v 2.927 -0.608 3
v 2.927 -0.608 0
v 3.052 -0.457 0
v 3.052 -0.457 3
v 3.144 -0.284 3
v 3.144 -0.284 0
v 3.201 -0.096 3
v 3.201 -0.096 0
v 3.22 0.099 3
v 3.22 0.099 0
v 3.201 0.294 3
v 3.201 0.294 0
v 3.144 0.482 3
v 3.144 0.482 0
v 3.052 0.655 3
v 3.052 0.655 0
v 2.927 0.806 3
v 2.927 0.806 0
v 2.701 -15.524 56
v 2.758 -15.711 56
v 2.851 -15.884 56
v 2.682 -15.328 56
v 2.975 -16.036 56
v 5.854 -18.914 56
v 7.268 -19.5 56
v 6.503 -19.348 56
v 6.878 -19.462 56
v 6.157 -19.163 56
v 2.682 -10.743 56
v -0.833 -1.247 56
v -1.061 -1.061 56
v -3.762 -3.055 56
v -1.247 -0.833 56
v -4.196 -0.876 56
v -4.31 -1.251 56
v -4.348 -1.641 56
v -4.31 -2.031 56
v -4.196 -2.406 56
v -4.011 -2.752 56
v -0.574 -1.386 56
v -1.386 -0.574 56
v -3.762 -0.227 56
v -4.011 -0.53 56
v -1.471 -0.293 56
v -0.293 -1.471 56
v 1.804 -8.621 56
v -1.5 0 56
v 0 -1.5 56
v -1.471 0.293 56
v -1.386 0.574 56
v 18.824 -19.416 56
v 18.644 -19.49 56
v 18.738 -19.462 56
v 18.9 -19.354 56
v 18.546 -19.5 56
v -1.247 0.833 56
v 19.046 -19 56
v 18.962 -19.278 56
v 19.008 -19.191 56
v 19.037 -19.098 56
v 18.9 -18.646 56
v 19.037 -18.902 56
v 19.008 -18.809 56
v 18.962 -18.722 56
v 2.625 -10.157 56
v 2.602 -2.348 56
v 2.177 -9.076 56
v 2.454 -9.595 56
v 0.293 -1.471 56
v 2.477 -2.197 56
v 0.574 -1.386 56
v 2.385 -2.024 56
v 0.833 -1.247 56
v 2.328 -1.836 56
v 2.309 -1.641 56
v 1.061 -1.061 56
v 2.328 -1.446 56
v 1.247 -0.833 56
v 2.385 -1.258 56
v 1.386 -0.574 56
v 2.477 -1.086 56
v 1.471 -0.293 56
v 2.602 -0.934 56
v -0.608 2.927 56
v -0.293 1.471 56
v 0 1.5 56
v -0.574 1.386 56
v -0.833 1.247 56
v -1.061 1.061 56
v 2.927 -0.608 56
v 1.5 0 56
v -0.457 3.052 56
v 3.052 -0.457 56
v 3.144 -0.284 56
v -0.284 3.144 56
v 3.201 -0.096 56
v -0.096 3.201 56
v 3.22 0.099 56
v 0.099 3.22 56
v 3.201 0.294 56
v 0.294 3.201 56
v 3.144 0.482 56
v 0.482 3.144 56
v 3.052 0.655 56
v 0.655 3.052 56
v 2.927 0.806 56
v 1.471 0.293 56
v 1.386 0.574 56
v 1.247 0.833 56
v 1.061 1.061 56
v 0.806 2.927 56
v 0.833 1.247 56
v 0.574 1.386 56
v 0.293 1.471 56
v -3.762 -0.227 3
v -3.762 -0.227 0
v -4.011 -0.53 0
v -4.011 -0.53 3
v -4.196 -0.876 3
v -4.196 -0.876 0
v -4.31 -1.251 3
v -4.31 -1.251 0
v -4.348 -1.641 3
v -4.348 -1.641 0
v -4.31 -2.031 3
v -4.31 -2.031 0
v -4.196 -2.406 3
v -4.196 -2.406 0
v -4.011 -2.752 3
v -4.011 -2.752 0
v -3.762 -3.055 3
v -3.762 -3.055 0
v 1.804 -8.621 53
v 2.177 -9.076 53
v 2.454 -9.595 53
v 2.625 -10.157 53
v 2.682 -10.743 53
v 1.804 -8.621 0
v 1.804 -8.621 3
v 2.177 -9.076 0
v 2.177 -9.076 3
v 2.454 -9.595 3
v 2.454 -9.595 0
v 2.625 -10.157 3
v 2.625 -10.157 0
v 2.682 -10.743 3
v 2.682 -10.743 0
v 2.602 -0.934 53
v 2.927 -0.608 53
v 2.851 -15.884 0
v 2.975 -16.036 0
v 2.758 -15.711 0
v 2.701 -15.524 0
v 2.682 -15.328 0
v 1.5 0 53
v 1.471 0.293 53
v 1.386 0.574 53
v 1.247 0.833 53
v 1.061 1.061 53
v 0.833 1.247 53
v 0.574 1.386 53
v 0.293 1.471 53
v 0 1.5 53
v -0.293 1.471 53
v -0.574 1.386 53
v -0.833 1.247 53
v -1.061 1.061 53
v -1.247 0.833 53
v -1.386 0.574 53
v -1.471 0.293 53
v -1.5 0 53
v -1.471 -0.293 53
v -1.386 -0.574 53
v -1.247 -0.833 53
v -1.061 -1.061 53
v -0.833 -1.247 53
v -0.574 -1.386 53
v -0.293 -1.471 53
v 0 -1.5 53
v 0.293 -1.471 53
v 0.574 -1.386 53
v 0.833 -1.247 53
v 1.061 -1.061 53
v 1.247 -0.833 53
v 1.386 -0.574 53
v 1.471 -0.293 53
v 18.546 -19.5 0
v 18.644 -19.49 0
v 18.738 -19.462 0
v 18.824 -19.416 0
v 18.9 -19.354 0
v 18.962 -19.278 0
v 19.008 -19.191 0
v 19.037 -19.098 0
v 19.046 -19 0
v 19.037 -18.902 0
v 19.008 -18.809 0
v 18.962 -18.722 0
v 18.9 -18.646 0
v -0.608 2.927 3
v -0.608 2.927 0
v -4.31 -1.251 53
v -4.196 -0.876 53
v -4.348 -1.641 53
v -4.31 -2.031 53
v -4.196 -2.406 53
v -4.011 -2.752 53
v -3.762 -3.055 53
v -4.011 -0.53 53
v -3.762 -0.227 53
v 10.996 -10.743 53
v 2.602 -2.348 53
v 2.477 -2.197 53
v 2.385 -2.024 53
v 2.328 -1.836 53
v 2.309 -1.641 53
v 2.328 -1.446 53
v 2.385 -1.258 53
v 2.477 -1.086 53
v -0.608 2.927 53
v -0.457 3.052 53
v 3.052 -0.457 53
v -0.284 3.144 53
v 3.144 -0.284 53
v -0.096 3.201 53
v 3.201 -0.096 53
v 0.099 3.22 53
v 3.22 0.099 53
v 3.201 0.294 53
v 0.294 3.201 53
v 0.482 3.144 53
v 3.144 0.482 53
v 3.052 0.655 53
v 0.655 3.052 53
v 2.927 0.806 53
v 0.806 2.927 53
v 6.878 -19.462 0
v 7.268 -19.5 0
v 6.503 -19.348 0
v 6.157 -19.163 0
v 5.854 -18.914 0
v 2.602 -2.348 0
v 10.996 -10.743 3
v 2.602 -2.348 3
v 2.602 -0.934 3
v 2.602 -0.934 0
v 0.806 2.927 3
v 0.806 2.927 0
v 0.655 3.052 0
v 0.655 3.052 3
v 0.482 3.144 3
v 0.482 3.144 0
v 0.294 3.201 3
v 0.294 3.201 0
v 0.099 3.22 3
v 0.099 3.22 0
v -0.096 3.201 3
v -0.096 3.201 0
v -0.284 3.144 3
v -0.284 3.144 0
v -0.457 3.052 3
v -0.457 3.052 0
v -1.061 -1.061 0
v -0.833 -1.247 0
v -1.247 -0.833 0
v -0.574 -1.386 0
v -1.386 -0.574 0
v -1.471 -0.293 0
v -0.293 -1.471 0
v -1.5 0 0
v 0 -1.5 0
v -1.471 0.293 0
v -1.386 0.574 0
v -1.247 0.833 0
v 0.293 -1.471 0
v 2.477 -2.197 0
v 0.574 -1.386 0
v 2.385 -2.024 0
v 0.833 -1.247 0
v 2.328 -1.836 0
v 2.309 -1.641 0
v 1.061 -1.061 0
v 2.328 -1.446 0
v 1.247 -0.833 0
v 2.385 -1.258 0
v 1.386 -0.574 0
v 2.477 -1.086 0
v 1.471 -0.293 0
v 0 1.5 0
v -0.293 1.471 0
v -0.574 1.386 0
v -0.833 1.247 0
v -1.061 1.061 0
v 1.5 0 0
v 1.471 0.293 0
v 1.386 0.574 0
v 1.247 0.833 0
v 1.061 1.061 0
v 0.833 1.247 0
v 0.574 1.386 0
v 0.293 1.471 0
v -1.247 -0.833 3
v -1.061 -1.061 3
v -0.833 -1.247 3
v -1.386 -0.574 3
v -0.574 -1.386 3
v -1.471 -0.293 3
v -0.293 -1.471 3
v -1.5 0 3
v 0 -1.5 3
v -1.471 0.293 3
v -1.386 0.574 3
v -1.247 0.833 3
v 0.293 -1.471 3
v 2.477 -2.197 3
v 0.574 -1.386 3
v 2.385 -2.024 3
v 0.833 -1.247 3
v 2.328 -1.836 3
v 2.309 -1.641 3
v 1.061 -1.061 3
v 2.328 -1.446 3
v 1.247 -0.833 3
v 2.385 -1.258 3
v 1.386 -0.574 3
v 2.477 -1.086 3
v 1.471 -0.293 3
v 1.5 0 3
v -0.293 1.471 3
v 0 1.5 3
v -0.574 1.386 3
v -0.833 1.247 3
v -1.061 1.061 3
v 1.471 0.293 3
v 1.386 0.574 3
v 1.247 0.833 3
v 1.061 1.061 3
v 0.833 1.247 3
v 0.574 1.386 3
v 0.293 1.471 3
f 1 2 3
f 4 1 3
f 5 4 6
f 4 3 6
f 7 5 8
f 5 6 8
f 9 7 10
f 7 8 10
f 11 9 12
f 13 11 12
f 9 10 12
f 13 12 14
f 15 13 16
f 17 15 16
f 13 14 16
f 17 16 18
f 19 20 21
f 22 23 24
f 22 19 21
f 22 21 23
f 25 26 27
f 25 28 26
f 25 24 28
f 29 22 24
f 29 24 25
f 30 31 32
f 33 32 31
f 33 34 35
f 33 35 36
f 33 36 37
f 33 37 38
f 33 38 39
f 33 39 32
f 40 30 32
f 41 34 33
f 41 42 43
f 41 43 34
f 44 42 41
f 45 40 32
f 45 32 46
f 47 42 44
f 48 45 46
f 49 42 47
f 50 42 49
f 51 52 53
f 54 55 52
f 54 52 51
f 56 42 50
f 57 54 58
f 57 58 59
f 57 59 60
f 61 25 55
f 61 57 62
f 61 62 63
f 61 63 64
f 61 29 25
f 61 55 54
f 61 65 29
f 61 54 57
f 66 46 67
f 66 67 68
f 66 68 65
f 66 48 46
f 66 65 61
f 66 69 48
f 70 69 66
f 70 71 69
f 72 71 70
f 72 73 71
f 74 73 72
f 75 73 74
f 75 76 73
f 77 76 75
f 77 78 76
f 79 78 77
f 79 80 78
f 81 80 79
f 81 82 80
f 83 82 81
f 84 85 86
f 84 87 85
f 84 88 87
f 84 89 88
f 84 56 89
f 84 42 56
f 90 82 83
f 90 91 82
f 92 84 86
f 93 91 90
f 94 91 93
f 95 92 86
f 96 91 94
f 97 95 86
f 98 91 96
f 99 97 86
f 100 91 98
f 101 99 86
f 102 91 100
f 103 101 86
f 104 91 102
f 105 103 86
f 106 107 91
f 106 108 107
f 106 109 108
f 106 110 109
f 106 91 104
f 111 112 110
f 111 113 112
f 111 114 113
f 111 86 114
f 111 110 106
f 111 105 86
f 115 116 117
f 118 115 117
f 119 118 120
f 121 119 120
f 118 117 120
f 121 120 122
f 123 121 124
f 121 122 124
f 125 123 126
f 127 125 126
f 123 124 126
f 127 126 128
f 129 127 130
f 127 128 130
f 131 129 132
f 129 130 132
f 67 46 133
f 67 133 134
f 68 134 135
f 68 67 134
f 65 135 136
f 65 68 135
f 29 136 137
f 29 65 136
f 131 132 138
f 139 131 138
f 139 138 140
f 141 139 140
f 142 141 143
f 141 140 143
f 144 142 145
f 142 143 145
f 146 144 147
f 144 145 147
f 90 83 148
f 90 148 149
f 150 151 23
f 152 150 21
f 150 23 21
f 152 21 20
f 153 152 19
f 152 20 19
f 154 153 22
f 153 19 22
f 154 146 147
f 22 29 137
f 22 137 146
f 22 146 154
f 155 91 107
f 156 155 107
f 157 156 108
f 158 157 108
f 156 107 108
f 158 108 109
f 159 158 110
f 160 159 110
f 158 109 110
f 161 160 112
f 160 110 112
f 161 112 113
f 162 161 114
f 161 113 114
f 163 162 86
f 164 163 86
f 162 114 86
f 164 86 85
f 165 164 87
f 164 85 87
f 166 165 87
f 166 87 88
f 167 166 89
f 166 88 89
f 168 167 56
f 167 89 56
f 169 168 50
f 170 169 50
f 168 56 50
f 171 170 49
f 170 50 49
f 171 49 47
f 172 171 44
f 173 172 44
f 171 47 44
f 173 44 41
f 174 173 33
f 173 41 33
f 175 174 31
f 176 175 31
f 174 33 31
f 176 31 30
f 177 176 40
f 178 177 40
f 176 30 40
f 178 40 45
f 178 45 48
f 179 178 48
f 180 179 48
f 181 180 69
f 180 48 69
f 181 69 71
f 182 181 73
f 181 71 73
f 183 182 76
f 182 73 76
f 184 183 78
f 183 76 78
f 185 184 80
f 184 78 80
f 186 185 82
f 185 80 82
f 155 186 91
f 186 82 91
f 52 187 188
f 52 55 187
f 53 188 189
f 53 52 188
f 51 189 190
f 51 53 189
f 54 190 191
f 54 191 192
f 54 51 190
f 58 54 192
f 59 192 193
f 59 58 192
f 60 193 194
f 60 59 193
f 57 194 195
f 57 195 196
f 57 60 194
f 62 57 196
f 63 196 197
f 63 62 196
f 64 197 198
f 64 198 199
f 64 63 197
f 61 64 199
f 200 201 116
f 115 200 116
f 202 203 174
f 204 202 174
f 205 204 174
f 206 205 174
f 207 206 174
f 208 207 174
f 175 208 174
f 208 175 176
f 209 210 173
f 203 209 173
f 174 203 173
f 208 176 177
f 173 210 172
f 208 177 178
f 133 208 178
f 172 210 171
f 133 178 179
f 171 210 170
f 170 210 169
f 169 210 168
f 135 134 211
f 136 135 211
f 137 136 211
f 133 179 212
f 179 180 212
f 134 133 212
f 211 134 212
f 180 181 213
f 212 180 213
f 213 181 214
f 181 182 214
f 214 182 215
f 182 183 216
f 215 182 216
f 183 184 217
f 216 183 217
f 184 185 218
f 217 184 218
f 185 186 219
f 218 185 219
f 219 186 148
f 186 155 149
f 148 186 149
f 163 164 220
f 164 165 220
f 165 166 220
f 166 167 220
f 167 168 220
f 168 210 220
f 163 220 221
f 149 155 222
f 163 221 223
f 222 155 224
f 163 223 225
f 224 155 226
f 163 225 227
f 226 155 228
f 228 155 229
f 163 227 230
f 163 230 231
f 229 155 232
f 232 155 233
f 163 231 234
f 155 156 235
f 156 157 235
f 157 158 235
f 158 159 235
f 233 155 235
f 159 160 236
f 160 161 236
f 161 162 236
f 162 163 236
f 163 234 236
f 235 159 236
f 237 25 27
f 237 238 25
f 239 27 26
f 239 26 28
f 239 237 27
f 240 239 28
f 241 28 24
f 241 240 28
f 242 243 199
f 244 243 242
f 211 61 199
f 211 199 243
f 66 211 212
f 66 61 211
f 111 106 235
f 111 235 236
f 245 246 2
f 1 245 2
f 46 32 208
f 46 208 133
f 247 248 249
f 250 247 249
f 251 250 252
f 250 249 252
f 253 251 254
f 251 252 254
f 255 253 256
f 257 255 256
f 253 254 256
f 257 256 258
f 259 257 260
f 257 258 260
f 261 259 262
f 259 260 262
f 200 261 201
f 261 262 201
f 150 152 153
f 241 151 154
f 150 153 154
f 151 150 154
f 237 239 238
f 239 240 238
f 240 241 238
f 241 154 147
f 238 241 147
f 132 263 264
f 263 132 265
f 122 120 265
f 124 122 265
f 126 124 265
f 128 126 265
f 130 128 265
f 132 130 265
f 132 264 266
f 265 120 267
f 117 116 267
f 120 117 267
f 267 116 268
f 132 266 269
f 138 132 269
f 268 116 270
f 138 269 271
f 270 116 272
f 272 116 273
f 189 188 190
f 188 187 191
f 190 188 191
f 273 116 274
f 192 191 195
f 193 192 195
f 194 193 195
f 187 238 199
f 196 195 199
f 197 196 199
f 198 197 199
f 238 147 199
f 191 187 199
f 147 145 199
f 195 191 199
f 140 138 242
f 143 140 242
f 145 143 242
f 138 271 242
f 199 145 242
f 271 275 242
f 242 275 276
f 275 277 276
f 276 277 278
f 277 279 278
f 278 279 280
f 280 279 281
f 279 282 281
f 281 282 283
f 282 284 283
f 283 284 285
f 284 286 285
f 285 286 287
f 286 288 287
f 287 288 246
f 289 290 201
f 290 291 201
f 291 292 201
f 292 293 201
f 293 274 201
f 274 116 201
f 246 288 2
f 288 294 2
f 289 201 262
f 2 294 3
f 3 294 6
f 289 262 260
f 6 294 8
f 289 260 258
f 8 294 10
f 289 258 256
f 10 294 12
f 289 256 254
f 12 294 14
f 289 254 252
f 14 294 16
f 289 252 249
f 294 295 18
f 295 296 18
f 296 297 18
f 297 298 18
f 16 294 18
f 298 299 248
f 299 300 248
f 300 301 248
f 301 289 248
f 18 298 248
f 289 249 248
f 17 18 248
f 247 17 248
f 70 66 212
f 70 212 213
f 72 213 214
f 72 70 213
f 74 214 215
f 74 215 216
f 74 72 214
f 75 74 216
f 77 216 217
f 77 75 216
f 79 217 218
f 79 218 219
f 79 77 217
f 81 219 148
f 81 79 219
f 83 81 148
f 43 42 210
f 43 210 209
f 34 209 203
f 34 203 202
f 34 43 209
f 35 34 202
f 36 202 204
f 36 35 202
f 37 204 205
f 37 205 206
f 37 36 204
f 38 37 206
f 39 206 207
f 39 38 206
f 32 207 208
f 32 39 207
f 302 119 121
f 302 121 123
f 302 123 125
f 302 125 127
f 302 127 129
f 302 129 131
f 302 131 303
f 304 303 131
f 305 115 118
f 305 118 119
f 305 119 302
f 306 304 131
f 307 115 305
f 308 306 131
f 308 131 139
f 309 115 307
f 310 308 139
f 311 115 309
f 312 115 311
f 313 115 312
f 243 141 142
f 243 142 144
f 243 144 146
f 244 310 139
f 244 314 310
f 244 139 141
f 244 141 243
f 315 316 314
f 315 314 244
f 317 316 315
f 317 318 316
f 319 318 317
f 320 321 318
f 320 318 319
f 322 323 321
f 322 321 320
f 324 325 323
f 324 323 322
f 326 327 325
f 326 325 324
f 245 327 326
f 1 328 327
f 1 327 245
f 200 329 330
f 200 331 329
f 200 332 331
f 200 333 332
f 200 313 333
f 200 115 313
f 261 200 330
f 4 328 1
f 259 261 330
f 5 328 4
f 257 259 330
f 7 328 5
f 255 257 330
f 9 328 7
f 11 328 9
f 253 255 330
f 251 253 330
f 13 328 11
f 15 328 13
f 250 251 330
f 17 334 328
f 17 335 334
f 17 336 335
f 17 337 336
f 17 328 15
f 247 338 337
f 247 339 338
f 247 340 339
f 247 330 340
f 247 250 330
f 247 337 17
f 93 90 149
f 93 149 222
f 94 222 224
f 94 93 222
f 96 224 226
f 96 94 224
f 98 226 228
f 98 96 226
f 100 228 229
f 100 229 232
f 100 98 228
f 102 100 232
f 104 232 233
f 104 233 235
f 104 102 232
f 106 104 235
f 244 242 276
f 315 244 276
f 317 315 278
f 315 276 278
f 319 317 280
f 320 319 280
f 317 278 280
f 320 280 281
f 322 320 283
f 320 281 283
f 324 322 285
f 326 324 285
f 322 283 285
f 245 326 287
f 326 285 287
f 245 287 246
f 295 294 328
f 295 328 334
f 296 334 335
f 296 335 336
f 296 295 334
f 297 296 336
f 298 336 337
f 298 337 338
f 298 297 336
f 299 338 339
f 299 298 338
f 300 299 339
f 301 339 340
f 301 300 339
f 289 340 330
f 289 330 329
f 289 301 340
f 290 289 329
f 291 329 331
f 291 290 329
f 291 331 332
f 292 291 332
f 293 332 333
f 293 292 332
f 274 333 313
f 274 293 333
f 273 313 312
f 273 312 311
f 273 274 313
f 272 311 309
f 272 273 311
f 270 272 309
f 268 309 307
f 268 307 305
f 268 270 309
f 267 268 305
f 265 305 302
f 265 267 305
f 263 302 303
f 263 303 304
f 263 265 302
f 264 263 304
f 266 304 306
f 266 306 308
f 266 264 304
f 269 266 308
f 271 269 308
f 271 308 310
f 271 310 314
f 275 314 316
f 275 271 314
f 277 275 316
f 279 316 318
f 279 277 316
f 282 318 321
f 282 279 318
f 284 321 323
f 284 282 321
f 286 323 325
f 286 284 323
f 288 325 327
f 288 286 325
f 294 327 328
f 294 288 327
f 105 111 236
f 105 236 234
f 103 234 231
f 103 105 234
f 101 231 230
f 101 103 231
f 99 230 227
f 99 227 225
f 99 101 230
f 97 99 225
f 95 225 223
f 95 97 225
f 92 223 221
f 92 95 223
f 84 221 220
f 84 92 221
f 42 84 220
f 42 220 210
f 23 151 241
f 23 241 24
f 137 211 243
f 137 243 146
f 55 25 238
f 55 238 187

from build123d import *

# Parameters (mm, degrees)
SKETCH1_R           = 1.5
BOSS_EXTRUDE1_DEPTH = 3
BOSS_EXTRUDE2_DEPTH = 25
SKETCH6_W           = 56
SKETCH6_H           = 9.11547301
CUT_EXTRUDE1_DEPTH  = 63.91555103
FILLET1_R           = 2
FILLET2_R           = 1


with BuildPart() as part:
    # Sketch1 → Boss-Extrude1 (new body)
    with BuildSketch(Plane.XY):
        with BuildLine():
            Line((-3.762452186, -3.055345405), (1.803522753, -8.621320344))
            ThreePointArc((1.803522753, -8.621320344), (2.453841007, -9.59459039), (2.68220241, -10.742640687))
            Line((2.68220241, -10.742640687), (2.68220241, -18.5))
            ThreePointArc((2.68220241, -18.5), (2.975095629, -19.207106781), (3.68220241, -19.5))
            Line((3.68220241, -19.5), (18.54616344, -19.5))
            ThreePointArc((18.54616344, -19.5), (19.008103207, -19.191341716), (18.899716831, -18.646446609))
            Line((18.899716831, -18.646446609), (2.601508845, -2.348238623))
            ThreePointArc((2.601508845, -2.348238623), (2.308615626, -1.641131842), (2.601508845, -0.934025061))
            Line((2.601508845, -0.934025061), (2.927422074, -0.608111832))
            ThreePointArc((2.927422074, -0.608111832), (3.220315293, 0.098994949), (2.927422074, 0.806101731))
            Line((2.927422074, 0.806101731), (0.806101731, 2.927422074))
            ThreePointArc((0.806101731, 2.927422074), (0.098994949, 3.220315293), (-0.608111832, 2.927422074))
            Line((-0.608111832, 2.927422074), (-1.641131842, 1.894402064))
            Line((-1.641131842, 1.894402064), (-3.762452186, -0.22691828))
            ThreePointArc((-3.762452186, -0.22691828), (-4.348238623, -1.641131842), (-3.762452186, -3.055345405))
        make_face()
        Circle(SKETCH1_R, mode=Mode.SUBTRACT)
    boss_extrude1 = extrude(amount=BOSS_EXTRUDE1_DEPTH)

    # Sketch2 → Boss-Extrude2 (add)
    with BuildSketch(Plane.XY.offset(3)):
        with BuildLine():
            Line((18.899716831, -18.646446609), (10.995910909, -10.742640687))
            Line((10.995910909, -10.742640687), (2.68220241, -10.742640687))
            Line((2.68220241, -10.742640687), (2.68220241, -18.5))
            ThreePointArc((2.68220241, -18.5), (2.975095629, -19.207106781), (3.68220241, -19.5))
            Line((3.68220241, -19.5), (18.54616344, -19.5))
            ThreePointArc((18.54616344, -19.5), (19.008103207, -19.191341716), (18.899716831, -18.646446609))
        make_face()
    boss_extrude2 = extrude(amount=BOSS_EXTRUDE2_DEPTH)

    # Mirror1: Boss-Extrude1, Boss-Extrude2 across plane
    add(boss_extrude1.mirror(Plane.XY.offset(28)))
    add(boss_extrude2.mirror(Plane.XY.offset(28)))

    # Sketch6 → Cut-Extrude1 (cut, through all)
    with BuildSketch(Plane(origin=(-6.530219139, -6.530219139, 0), x_dir=(0, 0, 1), z_dir=(-0.7071067811865487, -0.7071067811865465, 0))):
        with Locations((28, -17.586068001)):
            Rectangle(SKETCH6_W, SKETCH6_H)
    extrude(amount=CUT_EXTRUDE1_DEPTH, mode=Mode.SUBTRACT)

    # Fillet1
    fillet1_edges = [part.edges().sort_by_distance(p)[0] for p in [
        (6.439561723, -19.5, 28),
    ]]
    fillet(fillet1_edges, radius=FILLET1_R)

    # Fillet2
    fillet2_edges = [part.edges().sort_by_distance(p)[0] for p in [
        (2.68220241, -15.742640687, 28),
    ]]
    fillet(fillet2_edges, radius=FILLET2_R)


solid = part.part
